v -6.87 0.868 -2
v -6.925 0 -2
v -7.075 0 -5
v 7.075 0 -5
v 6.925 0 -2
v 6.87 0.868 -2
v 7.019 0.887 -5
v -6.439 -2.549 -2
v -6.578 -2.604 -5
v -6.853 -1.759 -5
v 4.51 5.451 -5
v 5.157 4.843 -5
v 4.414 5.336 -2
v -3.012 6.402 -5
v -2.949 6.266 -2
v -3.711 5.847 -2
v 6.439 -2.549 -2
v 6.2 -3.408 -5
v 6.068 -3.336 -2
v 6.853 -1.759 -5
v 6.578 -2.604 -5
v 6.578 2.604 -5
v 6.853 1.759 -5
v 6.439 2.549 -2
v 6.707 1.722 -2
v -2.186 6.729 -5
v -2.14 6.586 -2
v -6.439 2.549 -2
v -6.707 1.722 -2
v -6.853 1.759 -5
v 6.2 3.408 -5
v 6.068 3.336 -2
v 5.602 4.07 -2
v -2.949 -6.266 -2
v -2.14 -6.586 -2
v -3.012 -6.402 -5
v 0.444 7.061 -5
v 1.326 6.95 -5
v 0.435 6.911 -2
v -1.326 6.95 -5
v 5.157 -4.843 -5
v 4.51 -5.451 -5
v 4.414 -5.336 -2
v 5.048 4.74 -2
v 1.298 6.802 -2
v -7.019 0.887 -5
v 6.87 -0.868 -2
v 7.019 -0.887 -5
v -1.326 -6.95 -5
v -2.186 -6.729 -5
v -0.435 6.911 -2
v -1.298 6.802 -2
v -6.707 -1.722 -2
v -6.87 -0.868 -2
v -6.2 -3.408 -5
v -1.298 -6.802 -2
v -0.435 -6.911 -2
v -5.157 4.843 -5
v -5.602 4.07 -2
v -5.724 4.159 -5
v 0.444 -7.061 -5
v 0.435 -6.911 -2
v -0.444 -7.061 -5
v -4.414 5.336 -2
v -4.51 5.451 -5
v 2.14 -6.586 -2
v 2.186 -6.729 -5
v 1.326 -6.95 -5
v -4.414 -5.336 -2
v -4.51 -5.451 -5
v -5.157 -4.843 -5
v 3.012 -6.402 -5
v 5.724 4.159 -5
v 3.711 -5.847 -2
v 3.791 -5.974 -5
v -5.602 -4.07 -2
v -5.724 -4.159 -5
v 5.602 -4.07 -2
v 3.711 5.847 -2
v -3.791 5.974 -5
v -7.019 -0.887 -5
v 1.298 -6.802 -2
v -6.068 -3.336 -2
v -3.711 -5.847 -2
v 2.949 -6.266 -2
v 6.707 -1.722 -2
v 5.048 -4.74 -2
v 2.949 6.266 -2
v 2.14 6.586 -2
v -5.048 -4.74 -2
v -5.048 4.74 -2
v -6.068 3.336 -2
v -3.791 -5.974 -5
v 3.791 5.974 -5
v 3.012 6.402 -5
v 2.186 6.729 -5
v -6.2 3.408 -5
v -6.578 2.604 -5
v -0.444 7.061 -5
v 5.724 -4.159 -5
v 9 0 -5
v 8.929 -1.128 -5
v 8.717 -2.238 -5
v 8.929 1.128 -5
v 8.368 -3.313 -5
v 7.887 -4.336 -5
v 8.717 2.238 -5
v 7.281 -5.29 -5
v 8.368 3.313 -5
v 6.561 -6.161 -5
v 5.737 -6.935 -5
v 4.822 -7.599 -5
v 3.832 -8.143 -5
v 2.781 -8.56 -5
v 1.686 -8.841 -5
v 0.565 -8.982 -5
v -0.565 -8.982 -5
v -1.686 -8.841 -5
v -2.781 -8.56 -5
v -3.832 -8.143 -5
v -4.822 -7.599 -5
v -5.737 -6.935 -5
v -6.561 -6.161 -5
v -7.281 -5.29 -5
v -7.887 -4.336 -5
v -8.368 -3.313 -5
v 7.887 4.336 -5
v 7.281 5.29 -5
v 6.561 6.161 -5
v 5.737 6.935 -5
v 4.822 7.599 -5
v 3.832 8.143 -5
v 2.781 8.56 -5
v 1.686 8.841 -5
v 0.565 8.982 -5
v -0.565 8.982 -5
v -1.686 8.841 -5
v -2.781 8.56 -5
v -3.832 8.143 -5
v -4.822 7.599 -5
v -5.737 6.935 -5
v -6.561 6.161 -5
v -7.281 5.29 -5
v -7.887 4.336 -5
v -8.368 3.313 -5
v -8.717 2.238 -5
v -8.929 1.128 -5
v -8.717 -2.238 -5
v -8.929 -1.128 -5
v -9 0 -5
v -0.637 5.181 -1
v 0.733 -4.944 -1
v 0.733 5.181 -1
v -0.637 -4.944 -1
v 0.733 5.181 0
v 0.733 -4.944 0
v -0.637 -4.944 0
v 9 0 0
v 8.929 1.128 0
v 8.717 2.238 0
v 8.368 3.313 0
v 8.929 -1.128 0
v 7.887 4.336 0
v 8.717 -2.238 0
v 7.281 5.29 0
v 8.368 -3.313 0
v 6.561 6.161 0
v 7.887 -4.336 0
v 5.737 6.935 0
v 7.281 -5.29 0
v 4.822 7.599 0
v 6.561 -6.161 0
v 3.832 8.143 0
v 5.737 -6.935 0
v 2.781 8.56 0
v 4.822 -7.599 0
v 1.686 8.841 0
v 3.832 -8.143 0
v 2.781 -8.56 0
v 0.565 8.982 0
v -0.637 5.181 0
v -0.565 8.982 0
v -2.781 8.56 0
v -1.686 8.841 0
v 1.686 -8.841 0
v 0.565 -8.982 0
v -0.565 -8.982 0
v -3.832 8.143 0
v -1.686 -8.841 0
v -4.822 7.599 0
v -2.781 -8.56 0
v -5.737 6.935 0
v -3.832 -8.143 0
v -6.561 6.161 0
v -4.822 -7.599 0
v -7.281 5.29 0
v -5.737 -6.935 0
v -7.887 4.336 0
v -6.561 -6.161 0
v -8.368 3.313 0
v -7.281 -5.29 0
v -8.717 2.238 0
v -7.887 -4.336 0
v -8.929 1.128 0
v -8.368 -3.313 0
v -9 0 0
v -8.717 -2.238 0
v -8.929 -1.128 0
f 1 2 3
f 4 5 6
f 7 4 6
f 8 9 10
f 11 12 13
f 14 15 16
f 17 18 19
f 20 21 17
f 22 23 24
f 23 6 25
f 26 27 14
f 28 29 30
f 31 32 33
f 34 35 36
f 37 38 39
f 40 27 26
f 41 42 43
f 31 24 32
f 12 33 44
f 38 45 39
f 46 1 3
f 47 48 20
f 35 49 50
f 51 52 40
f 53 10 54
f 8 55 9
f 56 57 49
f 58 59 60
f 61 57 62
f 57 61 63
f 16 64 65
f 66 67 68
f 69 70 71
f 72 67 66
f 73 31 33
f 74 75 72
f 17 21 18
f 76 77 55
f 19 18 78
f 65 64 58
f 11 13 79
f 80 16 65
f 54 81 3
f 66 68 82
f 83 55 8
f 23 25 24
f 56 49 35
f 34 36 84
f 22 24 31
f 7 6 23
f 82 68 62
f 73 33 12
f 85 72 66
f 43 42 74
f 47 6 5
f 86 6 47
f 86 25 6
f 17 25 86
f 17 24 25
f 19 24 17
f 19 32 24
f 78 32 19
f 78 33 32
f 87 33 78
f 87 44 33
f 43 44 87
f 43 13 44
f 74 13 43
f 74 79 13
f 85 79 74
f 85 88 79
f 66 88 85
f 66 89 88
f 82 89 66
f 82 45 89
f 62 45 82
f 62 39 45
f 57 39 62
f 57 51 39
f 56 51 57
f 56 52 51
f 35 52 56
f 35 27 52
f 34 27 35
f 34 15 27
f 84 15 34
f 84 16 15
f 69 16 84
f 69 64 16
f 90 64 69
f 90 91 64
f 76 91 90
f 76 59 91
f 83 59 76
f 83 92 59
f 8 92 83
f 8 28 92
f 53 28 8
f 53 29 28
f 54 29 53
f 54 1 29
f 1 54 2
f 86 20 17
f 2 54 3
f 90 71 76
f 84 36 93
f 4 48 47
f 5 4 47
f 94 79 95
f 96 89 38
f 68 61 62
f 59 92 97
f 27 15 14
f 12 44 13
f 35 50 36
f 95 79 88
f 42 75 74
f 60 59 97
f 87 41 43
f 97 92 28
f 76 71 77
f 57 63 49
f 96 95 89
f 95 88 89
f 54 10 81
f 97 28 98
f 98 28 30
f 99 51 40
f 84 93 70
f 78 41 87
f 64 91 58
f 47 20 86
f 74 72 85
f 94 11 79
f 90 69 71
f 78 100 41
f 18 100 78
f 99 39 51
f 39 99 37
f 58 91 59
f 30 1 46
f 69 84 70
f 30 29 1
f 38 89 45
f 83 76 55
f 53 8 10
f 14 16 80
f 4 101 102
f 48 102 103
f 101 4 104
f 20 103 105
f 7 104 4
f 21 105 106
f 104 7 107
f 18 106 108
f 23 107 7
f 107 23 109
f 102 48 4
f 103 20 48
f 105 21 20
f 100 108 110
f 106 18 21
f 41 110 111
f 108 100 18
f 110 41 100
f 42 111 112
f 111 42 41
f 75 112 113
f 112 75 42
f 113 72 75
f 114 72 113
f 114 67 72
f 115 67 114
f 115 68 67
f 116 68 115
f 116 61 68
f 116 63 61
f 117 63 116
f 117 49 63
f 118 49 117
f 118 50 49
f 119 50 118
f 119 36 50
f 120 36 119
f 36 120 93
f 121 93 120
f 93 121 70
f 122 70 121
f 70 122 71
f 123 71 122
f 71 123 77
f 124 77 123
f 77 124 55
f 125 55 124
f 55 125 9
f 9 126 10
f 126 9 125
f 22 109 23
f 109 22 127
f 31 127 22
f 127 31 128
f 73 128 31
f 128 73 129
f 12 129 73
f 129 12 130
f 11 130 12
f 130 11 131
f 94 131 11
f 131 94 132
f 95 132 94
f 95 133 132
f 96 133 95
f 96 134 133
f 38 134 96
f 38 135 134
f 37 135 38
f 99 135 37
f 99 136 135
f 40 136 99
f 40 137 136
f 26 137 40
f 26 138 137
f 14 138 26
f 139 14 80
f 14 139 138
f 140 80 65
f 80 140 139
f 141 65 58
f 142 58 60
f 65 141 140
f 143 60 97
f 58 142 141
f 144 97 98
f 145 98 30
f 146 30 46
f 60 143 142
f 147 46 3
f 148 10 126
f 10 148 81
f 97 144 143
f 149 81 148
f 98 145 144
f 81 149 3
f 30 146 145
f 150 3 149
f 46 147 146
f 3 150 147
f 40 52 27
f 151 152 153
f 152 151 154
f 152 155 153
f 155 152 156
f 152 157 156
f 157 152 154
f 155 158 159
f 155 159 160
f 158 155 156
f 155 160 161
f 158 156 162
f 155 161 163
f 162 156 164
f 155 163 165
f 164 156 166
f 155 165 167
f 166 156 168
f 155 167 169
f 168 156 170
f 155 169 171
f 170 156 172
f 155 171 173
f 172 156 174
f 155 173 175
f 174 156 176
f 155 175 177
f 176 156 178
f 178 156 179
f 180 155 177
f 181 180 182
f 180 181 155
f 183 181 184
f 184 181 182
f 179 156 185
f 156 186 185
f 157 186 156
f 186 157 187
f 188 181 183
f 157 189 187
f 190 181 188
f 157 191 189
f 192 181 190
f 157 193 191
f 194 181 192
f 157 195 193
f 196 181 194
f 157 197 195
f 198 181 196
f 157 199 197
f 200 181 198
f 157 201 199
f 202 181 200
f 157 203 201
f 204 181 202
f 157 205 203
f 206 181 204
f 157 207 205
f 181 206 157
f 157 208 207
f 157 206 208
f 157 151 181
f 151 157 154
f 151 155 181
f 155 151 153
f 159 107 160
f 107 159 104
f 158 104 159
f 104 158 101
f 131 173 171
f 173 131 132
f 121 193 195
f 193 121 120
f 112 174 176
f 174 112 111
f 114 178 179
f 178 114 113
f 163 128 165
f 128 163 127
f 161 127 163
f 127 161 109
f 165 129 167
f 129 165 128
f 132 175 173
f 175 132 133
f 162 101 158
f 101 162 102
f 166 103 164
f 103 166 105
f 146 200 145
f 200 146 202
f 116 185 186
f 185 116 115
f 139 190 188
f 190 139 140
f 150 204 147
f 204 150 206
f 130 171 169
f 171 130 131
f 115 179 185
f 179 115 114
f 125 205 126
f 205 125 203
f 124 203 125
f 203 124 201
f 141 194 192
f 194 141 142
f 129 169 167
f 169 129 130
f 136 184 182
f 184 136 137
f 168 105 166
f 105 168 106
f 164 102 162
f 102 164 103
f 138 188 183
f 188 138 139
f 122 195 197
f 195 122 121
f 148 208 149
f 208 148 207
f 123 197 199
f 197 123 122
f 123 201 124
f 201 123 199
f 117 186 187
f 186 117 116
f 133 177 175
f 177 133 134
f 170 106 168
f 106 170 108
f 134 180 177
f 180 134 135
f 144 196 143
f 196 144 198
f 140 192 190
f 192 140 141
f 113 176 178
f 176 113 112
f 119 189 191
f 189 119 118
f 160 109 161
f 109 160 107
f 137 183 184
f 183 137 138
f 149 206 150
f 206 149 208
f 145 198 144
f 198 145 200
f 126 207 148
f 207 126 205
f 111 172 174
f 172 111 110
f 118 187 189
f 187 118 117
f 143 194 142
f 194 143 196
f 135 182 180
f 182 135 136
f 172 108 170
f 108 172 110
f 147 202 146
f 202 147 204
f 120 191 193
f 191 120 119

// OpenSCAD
$fn = 50;

difference() {
	union() {
		translate(v = [0, 0, -5.0]) {
			cylinder(h = 5, r = 9.0);
		}
	}
	union() {
		#translate(v = [0, 0, -5.0]) {
			cylinder(h = 3, r1 = 7.075, r2 = 6.925);
		}
		translate(v = [0, 0, -1]) {
			linear_extrude(height = 1) {
				text(font = "Impact", halign = "center", size = 10, text = "I", valign = "center");
			}
		}
	}
}
